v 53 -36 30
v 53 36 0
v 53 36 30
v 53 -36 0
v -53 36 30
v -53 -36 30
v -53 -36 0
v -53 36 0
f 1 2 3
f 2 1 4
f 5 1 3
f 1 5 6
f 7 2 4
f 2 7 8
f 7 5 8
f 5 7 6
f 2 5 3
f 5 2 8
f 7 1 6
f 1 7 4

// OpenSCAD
// Built by bench/smallmodels/features/compiler.py from a list of features.
$fn = 64;
difference() {
  union() {
    translate([0, 0, 0]) translate([-53, -36, 0]) cube([106, 72, 30]);
  }
  union() {
    translate([0, 0, 5]) rotate([0, 0, 0]) rotate([90, 0, 0]) cylinder(d = 11.2, h = 1120, center = true);
  }
}
union() {
    translate([0, 0, 0]) translate([-53, -36, 0]) cube([106, 72, 30]);
  }
